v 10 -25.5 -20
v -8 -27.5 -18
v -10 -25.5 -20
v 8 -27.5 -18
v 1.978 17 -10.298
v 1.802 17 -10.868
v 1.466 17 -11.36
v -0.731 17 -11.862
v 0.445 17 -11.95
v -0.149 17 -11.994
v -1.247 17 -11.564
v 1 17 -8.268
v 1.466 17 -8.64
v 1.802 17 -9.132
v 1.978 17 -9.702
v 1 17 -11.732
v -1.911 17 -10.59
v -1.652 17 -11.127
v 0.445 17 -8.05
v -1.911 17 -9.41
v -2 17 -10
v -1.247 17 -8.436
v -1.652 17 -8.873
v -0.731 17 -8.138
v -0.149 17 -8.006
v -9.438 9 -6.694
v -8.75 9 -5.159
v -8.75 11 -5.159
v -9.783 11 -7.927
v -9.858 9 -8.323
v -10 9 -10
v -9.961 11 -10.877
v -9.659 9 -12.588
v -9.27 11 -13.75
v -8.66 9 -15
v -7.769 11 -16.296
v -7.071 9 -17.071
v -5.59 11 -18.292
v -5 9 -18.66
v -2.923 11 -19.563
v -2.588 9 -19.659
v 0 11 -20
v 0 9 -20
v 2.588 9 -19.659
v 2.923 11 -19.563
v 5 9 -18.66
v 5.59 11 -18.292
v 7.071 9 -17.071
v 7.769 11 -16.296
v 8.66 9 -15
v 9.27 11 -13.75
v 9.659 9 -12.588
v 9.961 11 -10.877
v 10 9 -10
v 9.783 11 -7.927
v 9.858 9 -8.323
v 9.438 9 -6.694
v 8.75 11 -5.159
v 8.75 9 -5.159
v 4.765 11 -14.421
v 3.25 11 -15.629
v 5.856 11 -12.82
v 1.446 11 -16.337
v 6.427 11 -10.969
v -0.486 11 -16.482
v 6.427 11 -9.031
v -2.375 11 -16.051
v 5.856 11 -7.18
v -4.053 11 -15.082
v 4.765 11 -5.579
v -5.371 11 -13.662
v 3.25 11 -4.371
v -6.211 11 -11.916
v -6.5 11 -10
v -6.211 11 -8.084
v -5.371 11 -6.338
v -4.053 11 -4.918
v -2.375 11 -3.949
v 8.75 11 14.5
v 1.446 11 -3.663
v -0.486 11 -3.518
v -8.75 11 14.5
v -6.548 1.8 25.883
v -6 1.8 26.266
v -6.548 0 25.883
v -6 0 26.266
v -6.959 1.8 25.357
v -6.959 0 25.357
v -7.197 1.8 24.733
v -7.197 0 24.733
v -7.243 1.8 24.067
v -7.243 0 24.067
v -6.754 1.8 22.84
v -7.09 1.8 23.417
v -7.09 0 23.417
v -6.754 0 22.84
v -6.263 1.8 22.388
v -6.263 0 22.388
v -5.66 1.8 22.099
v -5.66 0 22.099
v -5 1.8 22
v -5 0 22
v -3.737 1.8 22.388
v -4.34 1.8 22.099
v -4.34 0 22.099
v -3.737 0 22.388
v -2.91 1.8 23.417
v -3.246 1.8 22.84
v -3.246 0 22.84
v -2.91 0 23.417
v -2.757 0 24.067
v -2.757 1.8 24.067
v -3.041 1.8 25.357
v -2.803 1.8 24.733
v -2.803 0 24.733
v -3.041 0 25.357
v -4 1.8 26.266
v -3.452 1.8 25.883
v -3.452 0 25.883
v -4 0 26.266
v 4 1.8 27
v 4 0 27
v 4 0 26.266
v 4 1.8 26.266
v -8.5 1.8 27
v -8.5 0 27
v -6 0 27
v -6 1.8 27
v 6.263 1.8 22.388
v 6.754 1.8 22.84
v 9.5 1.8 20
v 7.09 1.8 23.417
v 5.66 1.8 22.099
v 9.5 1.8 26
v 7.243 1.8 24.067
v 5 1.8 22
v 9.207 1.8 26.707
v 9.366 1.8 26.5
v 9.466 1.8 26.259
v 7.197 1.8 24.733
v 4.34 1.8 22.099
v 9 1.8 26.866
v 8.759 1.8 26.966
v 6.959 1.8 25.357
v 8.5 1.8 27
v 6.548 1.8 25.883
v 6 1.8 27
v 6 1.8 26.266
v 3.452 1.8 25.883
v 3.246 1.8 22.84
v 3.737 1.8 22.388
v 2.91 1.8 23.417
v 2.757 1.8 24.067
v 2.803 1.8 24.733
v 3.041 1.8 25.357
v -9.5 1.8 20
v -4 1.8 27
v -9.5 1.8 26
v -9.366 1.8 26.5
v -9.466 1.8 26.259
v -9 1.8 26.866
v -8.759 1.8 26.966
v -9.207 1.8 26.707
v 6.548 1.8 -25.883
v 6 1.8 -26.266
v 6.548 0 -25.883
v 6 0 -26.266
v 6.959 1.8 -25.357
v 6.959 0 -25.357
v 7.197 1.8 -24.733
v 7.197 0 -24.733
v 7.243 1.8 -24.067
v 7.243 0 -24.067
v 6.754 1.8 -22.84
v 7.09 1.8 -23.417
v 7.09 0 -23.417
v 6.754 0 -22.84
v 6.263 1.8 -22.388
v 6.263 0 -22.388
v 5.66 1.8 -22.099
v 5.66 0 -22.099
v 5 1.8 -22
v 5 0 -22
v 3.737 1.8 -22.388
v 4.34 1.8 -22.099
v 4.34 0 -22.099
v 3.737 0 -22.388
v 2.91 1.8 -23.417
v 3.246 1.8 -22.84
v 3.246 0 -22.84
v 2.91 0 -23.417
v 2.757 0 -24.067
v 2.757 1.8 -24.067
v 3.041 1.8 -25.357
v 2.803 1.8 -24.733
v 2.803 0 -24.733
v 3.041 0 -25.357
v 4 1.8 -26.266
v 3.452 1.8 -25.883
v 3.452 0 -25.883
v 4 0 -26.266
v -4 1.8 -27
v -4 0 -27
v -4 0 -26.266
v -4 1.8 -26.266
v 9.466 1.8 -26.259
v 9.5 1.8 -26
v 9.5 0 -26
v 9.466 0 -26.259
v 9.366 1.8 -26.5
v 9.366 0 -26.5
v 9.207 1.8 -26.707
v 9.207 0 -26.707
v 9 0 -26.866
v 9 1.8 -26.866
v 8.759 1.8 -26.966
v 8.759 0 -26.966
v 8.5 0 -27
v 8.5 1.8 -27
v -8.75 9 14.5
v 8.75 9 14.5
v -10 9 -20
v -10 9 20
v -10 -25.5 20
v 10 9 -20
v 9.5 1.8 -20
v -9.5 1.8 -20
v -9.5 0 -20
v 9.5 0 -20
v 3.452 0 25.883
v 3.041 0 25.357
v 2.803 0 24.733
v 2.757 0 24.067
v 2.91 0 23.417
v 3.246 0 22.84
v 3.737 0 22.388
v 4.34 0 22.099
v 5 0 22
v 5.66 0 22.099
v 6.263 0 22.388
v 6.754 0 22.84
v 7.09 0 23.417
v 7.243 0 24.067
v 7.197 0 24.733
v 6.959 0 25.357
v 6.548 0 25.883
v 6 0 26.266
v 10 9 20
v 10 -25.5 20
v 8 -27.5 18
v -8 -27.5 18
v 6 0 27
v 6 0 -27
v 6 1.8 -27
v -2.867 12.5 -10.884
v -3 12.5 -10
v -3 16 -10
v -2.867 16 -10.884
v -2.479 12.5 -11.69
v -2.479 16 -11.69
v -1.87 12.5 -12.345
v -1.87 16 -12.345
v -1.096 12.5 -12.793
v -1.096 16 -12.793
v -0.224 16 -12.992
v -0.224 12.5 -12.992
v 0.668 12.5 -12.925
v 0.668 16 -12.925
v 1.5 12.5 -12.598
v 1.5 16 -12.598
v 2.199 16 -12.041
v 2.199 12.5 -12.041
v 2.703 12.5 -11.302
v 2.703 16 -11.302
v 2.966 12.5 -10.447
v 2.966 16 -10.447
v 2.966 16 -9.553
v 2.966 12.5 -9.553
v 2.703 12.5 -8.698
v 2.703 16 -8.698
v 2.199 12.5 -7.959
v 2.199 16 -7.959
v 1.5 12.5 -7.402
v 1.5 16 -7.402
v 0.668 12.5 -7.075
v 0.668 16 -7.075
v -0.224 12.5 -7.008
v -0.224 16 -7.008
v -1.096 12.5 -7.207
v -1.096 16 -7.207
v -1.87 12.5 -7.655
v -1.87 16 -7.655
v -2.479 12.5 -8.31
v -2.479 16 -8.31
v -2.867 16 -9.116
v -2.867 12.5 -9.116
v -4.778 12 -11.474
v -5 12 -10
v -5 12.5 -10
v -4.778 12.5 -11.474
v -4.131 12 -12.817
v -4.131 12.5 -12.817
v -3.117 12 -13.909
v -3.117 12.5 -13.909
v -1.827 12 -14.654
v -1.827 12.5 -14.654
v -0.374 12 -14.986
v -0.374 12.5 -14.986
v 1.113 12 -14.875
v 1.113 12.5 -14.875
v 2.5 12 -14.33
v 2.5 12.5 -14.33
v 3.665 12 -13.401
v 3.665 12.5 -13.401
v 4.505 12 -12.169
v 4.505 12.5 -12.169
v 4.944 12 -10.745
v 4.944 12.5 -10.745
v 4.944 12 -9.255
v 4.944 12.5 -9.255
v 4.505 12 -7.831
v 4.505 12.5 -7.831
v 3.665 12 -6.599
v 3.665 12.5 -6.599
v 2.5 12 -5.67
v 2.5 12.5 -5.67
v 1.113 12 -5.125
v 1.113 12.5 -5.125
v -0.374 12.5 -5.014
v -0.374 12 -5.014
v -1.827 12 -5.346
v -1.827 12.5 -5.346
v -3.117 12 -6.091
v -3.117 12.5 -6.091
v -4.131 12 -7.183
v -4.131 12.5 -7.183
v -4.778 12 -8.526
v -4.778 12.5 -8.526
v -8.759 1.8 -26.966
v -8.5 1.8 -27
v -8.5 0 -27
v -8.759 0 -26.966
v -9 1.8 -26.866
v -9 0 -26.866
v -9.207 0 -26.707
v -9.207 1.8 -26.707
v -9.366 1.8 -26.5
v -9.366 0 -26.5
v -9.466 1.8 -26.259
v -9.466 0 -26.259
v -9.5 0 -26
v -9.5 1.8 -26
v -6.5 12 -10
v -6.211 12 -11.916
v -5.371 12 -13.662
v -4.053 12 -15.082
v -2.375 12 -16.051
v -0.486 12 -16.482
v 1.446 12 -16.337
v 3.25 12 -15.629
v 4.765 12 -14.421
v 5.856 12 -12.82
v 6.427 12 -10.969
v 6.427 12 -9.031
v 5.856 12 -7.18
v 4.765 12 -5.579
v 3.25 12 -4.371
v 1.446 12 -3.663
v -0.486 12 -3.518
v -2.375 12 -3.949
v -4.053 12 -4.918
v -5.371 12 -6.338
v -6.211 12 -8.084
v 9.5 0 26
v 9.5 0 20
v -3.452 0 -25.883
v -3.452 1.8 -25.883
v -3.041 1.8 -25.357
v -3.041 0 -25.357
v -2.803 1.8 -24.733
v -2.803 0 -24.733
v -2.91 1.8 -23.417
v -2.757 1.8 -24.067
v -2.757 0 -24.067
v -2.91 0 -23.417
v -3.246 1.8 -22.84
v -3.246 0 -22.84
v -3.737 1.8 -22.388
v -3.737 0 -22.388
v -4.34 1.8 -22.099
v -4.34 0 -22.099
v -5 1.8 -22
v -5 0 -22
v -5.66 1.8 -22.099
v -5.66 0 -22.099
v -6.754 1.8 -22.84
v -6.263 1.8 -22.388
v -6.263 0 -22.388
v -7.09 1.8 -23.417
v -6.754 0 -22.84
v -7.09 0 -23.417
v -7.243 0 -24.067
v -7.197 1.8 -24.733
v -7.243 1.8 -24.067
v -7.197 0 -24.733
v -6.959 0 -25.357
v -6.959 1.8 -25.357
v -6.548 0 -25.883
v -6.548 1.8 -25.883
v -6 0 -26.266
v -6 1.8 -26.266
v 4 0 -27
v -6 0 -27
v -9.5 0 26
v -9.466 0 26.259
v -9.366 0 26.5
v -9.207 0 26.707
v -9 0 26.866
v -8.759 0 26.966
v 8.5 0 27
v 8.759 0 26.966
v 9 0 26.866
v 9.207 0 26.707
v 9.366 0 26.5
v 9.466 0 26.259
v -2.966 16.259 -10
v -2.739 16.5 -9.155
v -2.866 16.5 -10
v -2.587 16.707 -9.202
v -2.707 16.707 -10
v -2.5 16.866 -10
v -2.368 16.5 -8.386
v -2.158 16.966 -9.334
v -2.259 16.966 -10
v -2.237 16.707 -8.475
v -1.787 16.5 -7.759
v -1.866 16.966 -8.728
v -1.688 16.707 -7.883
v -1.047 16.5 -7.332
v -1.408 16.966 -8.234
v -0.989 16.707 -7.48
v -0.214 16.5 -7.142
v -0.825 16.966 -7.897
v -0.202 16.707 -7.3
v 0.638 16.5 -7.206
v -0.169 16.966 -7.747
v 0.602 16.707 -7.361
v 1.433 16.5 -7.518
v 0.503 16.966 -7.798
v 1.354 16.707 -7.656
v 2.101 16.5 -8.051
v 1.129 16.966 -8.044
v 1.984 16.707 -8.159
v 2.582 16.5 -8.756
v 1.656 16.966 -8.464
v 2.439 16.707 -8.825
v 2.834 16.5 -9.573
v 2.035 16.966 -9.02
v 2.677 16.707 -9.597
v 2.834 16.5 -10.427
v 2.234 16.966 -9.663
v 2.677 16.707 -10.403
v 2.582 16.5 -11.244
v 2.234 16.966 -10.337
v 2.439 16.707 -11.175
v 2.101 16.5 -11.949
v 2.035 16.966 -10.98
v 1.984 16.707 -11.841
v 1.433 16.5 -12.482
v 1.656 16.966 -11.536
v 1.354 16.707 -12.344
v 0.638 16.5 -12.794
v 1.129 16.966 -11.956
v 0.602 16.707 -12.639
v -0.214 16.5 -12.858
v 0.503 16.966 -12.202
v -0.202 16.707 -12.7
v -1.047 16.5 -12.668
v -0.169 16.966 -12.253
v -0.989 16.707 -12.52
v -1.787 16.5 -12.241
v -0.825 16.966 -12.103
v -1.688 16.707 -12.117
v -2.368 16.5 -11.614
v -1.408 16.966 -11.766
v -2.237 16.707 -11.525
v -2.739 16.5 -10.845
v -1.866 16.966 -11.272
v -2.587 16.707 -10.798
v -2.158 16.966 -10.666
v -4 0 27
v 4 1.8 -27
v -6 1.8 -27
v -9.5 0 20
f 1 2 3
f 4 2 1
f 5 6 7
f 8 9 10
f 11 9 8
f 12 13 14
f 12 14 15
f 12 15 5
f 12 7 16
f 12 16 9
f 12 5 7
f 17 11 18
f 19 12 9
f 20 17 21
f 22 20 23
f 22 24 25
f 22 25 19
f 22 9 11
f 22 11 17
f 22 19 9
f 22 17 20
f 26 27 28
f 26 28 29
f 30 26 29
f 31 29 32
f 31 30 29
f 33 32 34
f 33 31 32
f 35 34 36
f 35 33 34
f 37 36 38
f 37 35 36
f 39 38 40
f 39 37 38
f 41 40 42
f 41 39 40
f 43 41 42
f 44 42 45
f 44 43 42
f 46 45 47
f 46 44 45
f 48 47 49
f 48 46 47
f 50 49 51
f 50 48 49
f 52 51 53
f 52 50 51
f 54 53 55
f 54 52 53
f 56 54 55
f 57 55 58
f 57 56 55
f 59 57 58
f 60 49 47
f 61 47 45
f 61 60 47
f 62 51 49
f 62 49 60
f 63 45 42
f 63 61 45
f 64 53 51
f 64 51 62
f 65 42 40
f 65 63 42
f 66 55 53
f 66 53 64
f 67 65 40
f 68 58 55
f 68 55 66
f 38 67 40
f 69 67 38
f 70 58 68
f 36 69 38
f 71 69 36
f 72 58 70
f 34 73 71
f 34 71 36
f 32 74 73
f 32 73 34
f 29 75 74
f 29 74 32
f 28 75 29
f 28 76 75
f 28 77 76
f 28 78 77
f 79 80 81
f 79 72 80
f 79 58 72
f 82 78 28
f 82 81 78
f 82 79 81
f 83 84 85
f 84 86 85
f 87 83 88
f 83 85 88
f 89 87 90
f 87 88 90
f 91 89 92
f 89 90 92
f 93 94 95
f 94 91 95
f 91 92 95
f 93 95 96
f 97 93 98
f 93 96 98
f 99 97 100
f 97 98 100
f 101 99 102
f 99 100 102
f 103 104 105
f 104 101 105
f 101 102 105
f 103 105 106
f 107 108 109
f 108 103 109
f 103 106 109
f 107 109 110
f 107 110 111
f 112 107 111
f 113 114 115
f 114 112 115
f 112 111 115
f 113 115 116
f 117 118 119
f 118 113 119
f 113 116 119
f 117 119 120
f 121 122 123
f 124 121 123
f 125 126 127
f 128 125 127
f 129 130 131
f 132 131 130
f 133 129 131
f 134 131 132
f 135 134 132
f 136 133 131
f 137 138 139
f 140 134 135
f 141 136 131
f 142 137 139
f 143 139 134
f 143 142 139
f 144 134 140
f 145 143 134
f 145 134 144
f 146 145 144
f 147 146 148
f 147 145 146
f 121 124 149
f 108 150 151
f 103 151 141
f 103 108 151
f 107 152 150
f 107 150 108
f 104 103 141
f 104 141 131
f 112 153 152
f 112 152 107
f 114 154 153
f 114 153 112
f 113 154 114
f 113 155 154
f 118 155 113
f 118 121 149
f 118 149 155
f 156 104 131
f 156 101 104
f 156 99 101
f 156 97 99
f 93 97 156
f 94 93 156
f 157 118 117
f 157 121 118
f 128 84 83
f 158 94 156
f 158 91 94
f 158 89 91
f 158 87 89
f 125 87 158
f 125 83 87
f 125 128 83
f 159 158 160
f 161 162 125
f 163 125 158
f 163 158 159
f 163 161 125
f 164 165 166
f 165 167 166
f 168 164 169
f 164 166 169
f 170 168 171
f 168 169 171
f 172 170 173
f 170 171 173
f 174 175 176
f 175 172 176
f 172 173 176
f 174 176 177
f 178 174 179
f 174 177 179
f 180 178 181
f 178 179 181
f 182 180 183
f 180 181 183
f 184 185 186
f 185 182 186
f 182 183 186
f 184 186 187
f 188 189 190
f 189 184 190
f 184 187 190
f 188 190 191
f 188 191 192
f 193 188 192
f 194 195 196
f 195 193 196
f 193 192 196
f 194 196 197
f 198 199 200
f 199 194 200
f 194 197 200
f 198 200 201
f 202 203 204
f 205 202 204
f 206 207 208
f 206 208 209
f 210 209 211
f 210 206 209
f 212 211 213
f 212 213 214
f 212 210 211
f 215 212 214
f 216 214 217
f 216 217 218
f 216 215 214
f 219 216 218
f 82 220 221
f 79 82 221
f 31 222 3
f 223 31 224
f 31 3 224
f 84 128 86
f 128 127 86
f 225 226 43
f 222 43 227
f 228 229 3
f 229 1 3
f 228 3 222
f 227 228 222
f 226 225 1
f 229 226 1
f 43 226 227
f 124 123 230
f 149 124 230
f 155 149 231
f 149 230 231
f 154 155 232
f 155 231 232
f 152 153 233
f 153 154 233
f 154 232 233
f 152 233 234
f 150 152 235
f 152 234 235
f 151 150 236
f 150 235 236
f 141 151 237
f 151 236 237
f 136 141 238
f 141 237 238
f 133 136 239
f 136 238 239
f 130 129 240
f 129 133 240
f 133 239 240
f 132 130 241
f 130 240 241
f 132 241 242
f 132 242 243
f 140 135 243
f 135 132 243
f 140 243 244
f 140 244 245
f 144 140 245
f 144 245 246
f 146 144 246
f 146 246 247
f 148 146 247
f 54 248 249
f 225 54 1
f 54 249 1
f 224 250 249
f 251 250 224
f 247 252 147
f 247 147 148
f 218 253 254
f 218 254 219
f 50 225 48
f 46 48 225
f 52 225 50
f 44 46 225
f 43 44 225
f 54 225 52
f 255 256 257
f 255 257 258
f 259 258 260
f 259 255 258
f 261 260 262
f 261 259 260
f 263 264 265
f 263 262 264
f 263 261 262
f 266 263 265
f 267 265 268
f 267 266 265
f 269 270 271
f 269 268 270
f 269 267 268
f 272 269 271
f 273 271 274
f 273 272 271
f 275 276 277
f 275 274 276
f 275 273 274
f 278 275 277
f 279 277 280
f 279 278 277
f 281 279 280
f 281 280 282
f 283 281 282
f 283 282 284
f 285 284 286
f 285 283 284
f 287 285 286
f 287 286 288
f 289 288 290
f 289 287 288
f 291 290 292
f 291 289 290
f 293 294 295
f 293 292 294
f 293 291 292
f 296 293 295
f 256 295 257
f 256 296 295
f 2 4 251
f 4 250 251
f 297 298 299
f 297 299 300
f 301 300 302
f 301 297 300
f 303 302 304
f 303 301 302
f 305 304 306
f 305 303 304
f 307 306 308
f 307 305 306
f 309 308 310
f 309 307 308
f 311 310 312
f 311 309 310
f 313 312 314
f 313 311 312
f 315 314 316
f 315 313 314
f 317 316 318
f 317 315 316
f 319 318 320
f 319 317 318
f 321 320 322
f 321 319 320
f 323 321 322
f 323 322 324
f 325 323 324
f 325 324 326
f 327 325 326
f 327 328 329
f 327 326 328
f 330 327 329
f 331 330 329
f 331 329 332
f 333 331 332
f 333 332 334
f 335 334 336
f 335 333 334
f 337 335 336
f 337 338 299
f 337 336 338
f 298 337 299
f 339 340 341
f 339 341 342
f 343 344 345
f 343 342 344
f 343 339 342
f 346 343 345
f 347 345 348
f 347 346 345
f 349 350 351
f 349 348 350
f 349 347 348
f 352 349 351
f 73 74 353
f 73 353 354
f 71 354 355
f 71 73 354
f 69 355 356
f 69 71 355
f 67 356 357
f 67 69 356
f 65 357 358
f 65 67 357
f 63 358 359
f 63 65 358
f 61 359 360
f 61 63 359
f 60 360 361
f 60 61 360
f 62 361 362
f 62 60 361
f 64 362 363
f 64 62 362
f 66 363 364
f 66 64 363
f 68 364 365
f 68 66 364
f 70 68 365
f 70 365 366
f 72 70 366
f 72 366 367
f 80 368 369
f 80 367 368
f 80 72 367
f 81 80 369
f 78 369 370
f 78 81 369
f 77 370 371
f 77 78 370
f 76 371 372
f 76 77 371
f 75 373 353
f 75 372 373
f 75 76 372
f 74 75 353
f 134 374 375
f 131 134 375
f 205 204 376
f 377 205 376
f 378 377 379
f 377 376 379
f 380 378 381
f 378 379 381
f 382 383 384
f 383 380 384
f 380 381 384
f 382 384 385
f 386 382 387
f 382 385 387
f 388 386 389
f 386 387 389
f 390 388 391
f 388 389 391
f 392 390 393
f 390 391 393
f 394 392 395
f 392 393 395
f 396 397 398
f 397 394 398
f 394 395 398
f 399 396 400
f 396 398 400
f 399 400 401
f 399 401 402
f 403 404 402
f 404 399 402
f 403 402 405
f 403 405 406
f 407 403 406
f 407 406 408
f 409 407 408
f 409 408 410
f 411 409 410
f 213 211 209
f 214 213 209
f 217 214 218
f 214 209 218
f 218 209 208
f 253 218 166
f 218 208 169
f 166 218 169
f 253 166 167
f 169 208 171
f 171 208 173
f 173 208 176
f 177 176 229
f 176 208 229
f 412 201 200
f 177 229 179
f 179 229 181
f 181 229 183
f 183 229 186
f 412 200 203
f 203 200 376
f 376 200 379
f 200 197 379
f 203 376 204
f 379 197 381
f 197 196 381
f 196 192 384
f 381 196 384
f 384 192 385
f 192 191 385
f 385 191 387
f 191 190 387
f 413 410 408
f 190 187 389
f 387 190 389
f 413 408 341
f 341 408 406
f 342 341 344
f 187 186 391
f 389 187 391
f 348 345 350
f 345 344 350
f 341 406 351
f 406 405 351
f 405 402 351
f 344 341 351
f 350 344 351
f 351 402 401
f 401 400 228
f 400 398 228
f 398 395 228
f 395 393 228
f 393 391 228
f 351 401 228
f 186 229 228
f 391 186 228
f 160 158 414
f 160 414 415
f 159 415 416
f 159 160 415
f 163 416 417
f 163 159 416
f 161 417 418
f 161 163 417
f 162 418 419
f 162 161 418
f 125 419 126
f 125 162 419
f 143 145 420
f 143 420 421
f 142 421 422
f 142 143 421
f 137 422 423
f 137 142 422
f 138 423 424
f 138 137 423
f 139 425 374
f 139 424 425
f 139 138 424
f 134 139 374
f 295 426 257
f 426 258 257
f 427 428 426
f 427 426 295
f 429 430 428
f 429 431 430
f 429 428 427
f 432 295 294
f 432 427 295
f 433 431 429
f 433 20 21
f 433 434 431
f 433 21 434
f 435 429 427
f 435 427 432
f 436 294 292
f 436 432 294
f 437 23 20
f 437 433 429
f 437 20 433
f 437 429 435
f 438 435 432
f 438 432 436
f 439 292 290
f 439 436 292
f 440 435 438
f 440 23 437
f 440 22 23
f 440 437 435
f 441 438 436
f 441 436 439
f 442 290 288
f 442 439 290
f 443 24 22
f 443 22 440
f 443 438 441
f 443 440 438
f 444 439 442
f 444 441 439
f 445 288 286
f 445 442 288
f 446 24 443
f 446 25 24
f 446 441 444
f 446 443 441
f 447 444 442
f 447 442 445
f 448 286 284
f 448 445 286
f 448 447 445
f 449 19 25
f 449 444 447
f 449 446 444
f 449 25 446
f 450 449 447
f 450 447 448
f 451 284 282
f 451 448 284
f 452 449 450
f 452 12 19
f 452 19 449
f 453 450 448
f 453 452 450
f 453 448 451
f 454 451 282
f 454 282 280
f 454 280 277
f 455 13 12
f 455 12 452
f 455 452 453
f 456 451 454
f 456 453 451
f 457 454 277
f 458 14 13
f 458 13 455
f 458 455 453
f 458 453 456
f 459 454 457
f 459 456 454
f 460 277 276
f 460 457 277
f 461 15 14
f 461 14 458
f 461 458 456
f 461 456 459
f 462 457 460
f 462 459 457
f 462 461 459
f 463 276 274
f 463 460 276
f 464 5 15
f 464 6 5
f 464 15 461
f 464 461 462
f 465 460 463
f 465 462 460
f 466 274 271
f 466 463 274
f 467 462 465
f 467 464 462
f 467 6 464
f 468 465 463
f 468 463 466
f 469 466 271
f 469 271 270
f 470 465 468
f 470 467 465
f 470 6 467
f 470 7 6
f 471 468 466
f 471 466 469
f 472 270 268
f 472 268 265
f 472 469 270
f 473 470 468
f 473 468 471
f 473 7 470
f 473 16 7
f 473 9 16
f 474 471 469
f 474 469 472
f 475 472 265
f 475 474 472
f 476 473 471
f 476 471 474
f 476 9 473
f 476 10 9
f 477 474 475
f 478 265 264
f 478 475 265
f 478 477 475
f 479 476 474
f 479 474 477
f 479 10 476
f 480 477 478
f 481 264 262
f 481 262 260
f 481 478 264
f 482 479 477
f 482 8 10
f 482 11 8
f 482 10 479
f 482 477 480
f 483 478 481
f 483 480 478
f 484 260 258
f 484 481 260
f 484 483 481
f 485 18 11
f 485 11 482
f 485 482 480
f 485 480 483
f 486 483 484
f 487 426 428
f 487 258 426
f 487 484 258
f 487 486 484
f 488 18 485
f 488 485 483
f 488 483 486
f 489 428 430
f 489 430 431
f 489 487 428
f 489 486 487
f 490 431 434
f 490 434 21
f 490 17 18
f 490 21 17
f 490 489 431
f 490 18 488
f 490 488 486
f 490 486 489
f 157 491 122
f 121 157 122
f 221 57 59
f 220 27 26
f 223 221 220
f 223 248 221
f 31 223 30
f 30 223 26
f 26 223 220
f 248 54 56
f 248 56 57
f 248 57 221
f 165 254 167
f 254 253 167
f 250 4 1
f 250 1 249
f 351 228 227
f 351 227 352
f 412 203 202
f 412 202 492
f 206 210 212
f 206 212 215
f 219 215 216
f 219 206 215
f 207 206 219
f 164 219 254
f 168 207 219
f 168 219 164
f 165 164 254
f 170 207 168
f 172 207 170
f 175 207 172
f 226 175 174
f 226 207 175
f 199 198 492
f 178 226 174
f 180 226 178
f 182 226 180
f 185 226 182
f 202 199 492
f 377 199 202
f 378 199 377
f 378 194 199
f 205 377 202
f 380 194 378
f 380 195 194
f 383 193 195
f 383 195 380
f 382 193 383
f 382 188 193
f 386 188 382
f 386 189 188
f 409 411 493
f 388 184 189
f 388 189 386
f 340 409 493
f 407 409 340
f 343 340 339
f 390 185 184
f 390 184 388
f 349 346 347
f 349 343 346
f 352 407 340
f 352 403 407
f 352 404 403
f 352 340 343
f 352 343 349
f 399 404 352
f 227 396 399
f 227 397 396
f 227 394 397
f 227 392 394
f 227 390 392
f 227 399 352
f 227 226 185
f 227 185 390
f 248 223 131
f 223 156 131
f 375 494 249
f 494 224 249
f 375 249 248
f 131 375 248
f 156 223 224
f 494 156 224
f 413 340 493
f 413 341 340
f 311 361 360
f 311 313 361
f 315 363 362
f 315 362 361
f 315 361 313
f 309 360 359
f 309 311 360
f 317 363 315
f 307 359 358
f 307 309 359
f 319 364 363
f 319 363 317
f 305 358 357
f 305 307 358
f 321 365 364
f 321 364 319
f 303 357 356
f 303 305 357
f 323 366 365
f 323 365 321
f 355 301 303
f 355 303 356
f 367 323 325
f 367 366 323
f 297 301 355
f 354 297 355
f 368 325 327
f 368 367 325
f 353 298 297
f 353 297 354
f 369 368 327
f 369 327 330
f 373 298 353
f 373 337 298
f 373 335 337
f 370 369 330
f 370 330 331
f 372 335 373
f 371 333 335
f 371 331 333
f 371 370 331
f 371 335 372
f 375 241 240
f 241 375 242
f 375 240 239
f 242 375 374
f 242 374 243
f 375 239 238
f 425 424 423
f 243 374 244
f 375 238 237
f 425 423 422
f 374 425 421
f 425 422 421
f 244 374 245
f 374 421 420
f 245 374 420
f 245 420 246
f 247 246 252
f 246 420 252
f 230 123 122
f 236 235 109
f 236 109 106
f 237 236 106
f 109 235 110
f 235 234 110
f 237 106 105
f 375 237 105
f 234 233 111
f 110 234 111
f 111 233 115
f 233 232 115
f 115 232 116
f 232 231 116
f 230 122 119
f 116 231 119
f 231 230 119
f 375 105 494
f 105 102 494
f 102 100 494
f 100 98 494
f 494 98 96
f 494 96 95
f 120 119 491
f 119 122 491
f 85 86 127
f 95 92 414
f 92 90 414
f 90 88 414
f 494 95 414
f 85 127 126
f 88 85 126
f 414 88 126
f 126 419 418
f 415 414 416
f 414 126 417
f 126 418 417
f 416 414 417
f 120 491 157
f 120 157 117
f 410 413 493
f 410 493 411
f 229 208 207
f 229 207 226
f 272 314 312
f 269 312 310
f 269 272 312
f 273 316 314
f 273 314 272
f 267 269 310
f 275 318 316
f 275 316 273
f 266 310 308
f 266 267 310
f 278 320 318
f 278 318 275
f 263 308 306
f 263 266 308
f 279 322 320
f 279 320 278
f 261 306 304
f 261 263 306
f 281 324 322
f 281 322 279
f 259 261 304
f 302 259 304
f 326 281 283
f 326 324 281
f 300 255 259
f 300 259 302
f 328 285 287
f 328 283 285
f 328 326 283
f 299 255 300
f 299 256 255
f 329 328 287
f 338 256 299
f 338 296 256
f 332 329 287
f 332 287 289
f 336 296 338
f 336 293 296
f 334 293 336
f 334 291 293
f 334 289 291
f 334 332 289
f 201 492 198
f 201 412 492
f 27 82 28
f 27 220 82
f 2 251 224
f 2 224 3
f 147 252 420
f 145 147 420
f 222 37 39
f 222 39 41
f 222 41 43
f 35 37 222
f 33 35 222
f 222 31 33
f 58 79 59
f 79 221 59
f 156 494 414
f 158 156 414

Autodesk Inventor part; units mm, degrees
ref_plane "YZ Plane" through (0, 0, 0) normal (1, 0, 0) x (0, 1, 0)
ref_plane "XZ Plane" through (0, 0, 0) normal (0, 1, 0) x (-1, 0, 0)
ref_plane "XY Plane" through (0, 0, 0) normal (0, 0, 1) x (1, 0, 0)
sketch "Sketch1" plane through (0, 0, 0) normal (0, 1, 0) x (-1, 0, 0)
  line L0 (10, 20) -> (-10, 20)
  line L1 (-10, 20) -> (-10, -20)
  line L2 (-10, -20) -> (10, -20)
  line L3 (10, -20) -> (10, 20)
  line L4 (21, 0) -> (-27, 0) construction
  line L5 (0, 26) -> (0, -28) construction
  line L6 (9.5, 20) -> (9.5, 27)
  line L7 (-9.5, 27) -> (-9.5, 20)
  line L8 (0.5, 20) -> (0.5, 27)
  line L9 (-0.5, 27) -> (-0.5, 20)
  arc A0 (4, 26.2656) -> (6, 26.2656) centre (5, 24.25) ccw
  line L10 (6, 27) -> (6, 26.2656)
  line L11 (4, 27) -> (4, 26.2656)
  line L12 (9.5, 27) -> (6, 27)
  arc A1 (-6, 26.2656) -> (-4, 26.2656) centre (-5, 24.25) ccw
  line L13 (-6, 27) -> (-6, 26.2656)
  line L14 (-4, 27) -> (-4, 26.2656)
  line L15 (4, 27) -> (-4, 27)
  line L16 (-6, 27) -> (-9.5, 27)
  line L17 (9.5, -20) -> (9.5, -27)
  line L18 (-9.5, -27) -> (-9.5, -20)
  line L19 (0.5, -20) -> (0.5, -27)
  line L20 (-0.5, -27) -> (-0.5, -20)
  arc A2 (6, -26.2656) -> (4, -26.2656) centre (5, -24.25) ccw
  line L21 (6, -27) -> (6, -26.2656)
  line L22 (4, -27) -> (4, -26.2656)
  line L23 (9.5, -27) -> (6, -27)
  line L24 (-6, -27) -> (-6, -26.2656)
  arc A3 (-4, -26.2656) -> (-6, -26.2656) centre (-5, -24.25) ccw
  line L25 (-4, -27) -> (-4, -26.2656)
  line L26 (4, -27) -> (-4, -27)
  line L27 (-6, -27) -> (-9.5, -27)
  arc A4 (-8.75, -5.1588) -> (8.75, -5.1588) centre (0, -10) ccw
  line L28 (8.75, 14.5) -> (-8.75, 14.5)
  line L29 (8.75, 14.5) -> (8.75, -5.1588)
  line L30 (-8.75, 14.5) -> (-8.75, -5.1588)
  circle A5 centre (0, -10) radius 6.5
  circle A6 centre (0, -10) radius 5
  circle A7 centre (0, -10) radius 3
  line L31 (9.5, -20) -> (-9.5, -20)
  line L32 (0.5, -20) -> (0.5, -27)
  line L33 (-0.5, -27) -> (-0.5, -20)
  point P0 (0, 0)
  dimension "d0" = 20
  dimension "d1" = 40
  dimension "d5" = 20
  dimension "d6" = 10
  dimension "d10" = 19
  dimension "d11" = 0.5
  dimension "d12" = 0.5
  dimension "d13" = 1
  dimension "d14" = 4.5
  dimension "d15" = 4.25
  dimension "d16" = 4.5
  dimension "d17" = 2
  dimension "d18" = 1
  dimension "d19" = 7
  dimension "d20" = 10
  dimension "d21" = 5.5
  dimension "d22" = 1.25
  dimension "d23" = 13
  dimension "d24" = 10
  dimension "d25" = 6
extrude "Extrusion1" add sketch "Sketch1" along normal blind 1.8 contours L3 A4 L29 L28 L30 L1 L0 | L0 L8 L15 L11 A0 L10 L12 L6 | L3 L2 A4 | A4 L30 L28 L29 | L0 L9 L15 L8 | L2 L19 L26 L20 | L2 L1 A4 | L0 L7 L16 L13 A1 L14 L15 L9 | L17 L23 L21 A2 L22 L26 L19 L2 | L20 L26 L25 A3 L24 L27 L18 L2 | A5 | A6 | A7
extrude "Extrusion2" add sketch "Sketch1" along normal blind 9 contours L3 A4 L29 L28 L30 L1 L0 | L3 L2 A4 | A4 L30 L28 L29 | L2 L1 A4 | A5 | A6 | A7
extrude "Extrusion3" add sketch "Sketch1" along normal blind 11 contours A4 L30 L28 L29
extrude "Extrusion4" cut sketch "Sketch1" along normal blind 12 contours A5
extrude "Extrusion5" add sketch "Sketch1" along normal blind 12 contours A5
extrude "Extrusion6" add sketch "Sketch1" along normal blind 12.5 contours A6
extrude "Extrusion7" cut sketch "Sketch1" along normal blind 17 contours A7
extrude "Extrusion8" add sketch "Sketch1" along normal blind 17 contours A7
extrude "Extrusion9" add sketch "Sketch1" against normal blind 27.5 contours L3 A4 L29 L28 L30 L1 L0 | L3 L2 A4 | A4 L30 L28 L29 | L2 L1 A4 | A5 | A6 | A7
fillet "Fillet1" radius 1 4 edges at (9.5, 0.9, -27) (-9.5, 0.9, -27) (9.5, 0.9, 27) (-9.5, 0.9, 27)
fillet "Fillet2" radius 1 1 edges at (3, 17, -10)
chamfer "Chamfer1" distance 2 angle 45 4 edges at (10, -27.5, 0) (0, -27.5, 20) (-10, -27.5, 0) (0, -27.5, -20)
properties part number "MG996R"
